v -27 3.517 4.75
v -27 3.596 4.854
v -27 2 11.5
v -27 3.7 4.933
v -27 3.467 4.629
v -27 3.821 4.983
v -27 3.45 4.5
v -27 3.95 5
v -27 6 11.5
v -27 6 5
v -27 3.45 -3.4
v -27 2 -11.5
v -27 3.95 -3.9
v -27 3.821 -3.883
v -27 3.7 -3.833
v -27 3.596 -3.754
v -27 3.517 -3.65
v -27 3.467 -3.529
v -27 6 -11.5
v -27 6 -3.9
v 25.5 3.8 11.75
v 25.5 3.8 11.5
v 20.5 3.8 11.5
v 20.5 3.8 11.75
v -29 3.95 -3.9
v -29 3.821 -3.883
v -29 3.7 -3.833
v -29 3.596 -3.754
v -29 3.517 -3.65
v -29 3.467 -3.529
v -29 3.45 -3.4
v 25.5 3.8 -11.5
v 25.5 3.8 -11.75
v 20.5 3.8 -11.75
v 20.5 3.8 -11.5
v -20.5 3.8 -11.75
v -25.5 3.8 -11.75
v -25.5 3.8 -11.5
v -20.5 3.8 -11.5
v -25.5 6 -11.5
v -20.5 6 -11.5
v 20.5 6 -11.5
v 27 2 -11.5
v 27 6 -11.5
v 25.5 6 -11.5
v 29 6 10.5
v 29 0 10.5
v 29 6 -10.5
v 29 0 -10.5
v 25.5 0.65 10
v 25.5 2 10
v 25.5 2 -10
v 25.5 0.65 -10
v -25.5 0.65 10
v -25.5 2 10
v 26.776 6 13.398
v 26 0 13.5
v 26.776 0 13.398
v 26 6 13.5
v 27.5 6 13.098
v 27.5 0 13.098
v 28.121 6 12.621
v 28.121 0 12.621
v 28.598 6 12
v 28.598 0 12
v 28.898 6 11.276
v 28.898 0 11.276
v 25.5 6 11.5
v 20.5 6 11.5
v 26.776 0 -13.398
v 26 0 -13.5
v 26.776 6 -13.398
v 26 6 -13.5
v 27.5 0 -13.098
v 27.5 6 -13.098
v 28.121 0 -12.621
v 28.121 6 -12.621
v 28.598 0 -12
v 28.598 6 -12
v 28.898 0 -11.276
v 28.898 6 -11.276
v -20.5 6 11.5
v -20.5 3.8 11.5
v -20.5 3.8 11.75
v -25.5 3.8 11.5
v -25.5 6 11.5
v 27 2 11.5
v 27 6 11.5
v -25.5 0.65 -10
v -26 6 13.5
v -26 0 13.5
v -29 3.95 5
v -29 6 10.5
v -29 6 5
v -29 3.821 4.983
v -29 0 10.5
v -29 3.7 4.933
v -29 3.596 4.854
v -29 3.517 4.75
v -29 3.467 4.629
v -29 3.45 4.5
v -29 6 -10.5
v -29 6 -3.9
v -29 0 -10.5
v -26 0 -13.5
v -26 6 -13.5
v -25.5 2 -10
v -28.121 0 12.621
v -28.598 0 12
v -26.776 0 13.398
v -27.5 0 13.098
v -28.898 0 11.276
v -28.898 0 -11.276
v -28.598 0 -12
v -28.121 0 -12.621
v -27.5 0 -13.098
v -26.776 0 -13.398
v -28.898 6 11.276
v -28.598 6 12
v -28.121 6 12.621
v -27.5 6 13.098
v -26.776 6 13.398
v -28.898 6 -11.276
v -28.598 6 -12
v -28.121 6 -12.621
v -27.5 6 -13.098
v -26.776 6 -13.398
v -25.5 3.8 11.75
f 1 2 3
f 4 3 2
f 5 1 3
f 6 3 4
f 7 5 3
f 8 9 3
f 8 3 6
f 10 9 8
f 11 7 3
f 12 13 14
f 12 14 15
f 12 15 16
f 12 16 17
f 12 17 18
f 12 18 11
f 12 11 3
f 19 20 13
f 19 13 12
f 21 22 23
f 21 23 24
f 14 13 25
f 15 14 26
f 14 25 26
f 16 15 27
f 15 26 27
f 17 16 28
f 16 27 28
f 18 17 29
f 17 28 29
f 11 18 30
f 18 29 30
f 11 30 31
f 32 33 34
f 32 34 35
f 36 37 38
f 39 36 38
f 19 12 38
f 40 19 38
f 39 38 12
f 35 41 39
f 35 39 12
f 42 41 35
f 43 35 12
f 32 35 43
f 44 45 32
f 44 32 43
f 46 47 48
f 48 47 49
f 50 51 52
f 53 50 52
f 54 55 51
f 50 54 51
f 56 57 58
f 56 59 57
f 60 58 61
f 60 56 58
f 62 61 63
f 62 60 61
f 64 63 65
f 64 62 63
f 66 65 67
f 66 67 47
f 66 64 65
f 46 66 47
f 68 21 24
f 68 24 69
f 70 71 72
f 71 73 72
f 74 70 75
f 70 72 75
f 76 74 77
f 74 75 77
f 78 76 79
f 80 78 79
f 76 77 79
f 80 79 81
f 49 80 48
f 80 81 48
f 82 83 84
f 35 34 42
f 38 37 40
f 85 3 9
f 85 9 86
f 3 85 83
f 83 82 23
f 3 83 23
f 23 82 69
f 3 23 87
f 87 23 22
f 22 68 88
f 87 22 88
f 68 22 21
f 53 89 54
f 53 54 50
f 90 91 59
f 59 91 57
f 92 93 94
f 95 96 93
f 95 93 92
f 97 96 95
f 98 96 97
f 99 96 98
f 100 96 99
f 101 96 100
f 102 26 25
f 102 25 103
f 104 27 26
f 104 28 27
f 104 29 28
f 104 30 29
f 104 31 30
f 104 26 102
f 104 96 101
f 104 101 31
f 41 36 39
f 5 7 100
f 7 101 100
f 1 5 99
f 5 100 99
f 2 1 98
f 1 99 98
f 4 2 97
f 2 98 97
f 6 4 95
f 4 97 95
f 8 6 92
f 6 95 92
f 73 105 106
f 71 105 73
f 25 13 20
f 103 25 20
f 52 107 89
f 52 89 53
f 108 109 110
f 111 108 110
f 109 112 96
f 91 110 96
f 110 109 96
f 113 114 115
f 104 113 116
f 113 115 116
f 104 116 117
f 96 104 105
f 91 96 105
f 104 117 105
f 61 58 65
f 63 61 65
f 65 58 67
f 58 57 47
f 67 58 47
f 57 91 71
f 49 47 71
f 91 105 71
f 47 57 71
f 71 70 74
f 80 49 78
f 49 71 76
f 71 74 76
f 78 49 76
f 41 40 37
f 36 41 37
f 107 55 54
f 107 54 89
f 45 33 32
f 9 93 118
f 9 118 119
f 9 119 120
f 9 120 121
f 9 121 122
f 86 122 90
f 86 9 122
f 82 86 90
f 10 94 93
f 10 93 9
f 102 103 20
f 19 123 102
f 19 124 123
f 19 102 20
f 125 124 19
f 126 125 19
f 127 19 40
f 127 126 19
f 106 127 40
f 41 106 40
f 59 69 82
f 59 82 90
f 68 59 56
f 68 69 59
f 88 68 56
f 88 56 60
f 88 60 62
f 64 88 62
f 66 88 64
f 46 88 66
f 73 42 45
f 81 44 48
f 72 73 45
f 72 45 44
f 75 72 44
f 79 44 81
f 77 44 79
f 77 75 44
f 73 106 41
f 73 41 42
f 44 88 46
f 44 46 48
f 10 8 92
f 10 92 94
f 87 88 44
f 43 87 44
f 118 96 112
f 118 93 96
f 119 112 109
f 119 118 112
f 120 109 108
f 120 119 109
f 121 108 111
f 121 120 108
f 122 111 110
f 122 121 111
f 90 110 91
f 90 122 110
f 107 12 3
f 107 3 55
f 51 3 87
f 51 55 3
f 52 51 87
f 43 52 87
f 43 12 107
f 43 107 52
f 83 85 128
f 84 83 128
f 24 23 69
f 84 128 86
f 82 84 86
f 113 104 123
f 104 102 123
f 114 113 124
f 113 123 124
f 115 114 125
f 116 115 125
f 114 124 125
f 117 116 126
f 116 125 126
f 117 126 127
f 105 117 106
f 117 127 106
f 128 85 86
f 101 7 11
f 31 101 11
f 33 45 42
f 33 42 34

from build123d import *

# Parameters (mm, degrees)
SKETCH1_W           = 58
SKETCH1_H           = 27
BOSS_EXTRUDE1_DEPTH = 6
SKETCH2_W           = 54
SKETCH2_H           = 23
CUT_EXTRUDE1_DEPTH  = 4
SKETCH3_W           = 8.9
SKETCH3_H           = 2.55
CUT_EXTRUDE2_DEPTH  = 58.915887285
FILLET1_R           = 0.5
FILLET2_R           = 3
SKETCH4_W           = 51
SKETCH4_H           = 20
CUT_EXTRUDE3_DEPTH  = 1.35
CUT_EXTRUDE5_DEPTH  = 5


with BuildPart() as part:
    # Sketch1 → Boss-Extrude1 (new body)
    with BuildSketch(Plane(origin=(0, 0, 0), x_dir=(1, 0, 0), z_dir=(0, 1, 0))):
        Rectangle(SKETCH1_W, SKETCH1_H)
    extrude(amount=BOSS_EXTRUDE1_DEPTH)

    # Sketch2 → Cut-Extrude1 (cut)
    with BuildSketch(Plane(origin=(0, 6, 0), x_dir=(1, 0, 0), z_dir=(0, 1, 0))):
        Rectangle(SKETCH2_W, SKETCH2_H)
    extrude(amount=-CUT_EXTRUDE1_DEPTH, mode=Mode.SUBTRACT)

    # Sketch3 → Cut-Extrude2 (cut, through all)
    with BuildSketch(Plane(origin=(-27, 0, 0), x_dir=(0, 0, -1), z_dir=(1, 0, 0))):
        with Locations((-0.55, 4.725)):
            Rectangle(SKETCH3_W, SKETCH3_H)
    extrude(amount=-CUT_EXTRUDE2_DEPTH, mode=Mode.SUBTRACT)

    # Fillet1
    fillet1_edges = [part.edges().sort_by_distance(p)[0] for p in [
        (-28, 3.45, 5),
        (-28, 3.45, -3.9),
    ]]
    fillet(fillet1_edges, radius=FILLET1_R)

    # Fillet2
    fillet2_edges = [part.edges().sort_by_distance(p)[0] for p in [
        (-29, 3, -13.5),
        (29, 3, -13.5),
        (29, 3, 13.5),
        (-29, 3, 13.5),
    ]]
    fillet(fillet2_edges, radius=FILLET2_R)

    # Sketch4 → Cut-Extrude3 (cut)
    with BuildSketch(Plane(origin=(0, 2, 0), x_dir=(1, 0, 0), z_dir=(0, 1, 0))):
        Rectangle(SKETCH4_W, SKETCH4_H)
    extrude(amount=-CUT_EXTRUDE3_DEPTH, mode=Mode.SUBTRACT)

    # Sketch6 → Cut-Extrude5 (cut)
    with BuildSketch(Plane.ZY.offset(-25.5)):
        Polygon((-11.75, 3.8), (-11.5, 3.8), (-11.5, 6), align=None)
        Polygon((11.5, 6), (11.5, 3.8), (11.75, 3.8), align=None)
    cut_extrude5 = extrude(amount=CUT_EXTRUDE5_DEPTH, mode=Mode.SUBTRACT)

    # Mirror1: Cut-Extrude5 across plane
    add(cut_extrude5.mirror(Plane(origin=(0, 0, 0), x_dir=(0, 0, 1), z_dir=(1, 0, 0))), mode=Mode.SUBTRACT)


solid = part.part
